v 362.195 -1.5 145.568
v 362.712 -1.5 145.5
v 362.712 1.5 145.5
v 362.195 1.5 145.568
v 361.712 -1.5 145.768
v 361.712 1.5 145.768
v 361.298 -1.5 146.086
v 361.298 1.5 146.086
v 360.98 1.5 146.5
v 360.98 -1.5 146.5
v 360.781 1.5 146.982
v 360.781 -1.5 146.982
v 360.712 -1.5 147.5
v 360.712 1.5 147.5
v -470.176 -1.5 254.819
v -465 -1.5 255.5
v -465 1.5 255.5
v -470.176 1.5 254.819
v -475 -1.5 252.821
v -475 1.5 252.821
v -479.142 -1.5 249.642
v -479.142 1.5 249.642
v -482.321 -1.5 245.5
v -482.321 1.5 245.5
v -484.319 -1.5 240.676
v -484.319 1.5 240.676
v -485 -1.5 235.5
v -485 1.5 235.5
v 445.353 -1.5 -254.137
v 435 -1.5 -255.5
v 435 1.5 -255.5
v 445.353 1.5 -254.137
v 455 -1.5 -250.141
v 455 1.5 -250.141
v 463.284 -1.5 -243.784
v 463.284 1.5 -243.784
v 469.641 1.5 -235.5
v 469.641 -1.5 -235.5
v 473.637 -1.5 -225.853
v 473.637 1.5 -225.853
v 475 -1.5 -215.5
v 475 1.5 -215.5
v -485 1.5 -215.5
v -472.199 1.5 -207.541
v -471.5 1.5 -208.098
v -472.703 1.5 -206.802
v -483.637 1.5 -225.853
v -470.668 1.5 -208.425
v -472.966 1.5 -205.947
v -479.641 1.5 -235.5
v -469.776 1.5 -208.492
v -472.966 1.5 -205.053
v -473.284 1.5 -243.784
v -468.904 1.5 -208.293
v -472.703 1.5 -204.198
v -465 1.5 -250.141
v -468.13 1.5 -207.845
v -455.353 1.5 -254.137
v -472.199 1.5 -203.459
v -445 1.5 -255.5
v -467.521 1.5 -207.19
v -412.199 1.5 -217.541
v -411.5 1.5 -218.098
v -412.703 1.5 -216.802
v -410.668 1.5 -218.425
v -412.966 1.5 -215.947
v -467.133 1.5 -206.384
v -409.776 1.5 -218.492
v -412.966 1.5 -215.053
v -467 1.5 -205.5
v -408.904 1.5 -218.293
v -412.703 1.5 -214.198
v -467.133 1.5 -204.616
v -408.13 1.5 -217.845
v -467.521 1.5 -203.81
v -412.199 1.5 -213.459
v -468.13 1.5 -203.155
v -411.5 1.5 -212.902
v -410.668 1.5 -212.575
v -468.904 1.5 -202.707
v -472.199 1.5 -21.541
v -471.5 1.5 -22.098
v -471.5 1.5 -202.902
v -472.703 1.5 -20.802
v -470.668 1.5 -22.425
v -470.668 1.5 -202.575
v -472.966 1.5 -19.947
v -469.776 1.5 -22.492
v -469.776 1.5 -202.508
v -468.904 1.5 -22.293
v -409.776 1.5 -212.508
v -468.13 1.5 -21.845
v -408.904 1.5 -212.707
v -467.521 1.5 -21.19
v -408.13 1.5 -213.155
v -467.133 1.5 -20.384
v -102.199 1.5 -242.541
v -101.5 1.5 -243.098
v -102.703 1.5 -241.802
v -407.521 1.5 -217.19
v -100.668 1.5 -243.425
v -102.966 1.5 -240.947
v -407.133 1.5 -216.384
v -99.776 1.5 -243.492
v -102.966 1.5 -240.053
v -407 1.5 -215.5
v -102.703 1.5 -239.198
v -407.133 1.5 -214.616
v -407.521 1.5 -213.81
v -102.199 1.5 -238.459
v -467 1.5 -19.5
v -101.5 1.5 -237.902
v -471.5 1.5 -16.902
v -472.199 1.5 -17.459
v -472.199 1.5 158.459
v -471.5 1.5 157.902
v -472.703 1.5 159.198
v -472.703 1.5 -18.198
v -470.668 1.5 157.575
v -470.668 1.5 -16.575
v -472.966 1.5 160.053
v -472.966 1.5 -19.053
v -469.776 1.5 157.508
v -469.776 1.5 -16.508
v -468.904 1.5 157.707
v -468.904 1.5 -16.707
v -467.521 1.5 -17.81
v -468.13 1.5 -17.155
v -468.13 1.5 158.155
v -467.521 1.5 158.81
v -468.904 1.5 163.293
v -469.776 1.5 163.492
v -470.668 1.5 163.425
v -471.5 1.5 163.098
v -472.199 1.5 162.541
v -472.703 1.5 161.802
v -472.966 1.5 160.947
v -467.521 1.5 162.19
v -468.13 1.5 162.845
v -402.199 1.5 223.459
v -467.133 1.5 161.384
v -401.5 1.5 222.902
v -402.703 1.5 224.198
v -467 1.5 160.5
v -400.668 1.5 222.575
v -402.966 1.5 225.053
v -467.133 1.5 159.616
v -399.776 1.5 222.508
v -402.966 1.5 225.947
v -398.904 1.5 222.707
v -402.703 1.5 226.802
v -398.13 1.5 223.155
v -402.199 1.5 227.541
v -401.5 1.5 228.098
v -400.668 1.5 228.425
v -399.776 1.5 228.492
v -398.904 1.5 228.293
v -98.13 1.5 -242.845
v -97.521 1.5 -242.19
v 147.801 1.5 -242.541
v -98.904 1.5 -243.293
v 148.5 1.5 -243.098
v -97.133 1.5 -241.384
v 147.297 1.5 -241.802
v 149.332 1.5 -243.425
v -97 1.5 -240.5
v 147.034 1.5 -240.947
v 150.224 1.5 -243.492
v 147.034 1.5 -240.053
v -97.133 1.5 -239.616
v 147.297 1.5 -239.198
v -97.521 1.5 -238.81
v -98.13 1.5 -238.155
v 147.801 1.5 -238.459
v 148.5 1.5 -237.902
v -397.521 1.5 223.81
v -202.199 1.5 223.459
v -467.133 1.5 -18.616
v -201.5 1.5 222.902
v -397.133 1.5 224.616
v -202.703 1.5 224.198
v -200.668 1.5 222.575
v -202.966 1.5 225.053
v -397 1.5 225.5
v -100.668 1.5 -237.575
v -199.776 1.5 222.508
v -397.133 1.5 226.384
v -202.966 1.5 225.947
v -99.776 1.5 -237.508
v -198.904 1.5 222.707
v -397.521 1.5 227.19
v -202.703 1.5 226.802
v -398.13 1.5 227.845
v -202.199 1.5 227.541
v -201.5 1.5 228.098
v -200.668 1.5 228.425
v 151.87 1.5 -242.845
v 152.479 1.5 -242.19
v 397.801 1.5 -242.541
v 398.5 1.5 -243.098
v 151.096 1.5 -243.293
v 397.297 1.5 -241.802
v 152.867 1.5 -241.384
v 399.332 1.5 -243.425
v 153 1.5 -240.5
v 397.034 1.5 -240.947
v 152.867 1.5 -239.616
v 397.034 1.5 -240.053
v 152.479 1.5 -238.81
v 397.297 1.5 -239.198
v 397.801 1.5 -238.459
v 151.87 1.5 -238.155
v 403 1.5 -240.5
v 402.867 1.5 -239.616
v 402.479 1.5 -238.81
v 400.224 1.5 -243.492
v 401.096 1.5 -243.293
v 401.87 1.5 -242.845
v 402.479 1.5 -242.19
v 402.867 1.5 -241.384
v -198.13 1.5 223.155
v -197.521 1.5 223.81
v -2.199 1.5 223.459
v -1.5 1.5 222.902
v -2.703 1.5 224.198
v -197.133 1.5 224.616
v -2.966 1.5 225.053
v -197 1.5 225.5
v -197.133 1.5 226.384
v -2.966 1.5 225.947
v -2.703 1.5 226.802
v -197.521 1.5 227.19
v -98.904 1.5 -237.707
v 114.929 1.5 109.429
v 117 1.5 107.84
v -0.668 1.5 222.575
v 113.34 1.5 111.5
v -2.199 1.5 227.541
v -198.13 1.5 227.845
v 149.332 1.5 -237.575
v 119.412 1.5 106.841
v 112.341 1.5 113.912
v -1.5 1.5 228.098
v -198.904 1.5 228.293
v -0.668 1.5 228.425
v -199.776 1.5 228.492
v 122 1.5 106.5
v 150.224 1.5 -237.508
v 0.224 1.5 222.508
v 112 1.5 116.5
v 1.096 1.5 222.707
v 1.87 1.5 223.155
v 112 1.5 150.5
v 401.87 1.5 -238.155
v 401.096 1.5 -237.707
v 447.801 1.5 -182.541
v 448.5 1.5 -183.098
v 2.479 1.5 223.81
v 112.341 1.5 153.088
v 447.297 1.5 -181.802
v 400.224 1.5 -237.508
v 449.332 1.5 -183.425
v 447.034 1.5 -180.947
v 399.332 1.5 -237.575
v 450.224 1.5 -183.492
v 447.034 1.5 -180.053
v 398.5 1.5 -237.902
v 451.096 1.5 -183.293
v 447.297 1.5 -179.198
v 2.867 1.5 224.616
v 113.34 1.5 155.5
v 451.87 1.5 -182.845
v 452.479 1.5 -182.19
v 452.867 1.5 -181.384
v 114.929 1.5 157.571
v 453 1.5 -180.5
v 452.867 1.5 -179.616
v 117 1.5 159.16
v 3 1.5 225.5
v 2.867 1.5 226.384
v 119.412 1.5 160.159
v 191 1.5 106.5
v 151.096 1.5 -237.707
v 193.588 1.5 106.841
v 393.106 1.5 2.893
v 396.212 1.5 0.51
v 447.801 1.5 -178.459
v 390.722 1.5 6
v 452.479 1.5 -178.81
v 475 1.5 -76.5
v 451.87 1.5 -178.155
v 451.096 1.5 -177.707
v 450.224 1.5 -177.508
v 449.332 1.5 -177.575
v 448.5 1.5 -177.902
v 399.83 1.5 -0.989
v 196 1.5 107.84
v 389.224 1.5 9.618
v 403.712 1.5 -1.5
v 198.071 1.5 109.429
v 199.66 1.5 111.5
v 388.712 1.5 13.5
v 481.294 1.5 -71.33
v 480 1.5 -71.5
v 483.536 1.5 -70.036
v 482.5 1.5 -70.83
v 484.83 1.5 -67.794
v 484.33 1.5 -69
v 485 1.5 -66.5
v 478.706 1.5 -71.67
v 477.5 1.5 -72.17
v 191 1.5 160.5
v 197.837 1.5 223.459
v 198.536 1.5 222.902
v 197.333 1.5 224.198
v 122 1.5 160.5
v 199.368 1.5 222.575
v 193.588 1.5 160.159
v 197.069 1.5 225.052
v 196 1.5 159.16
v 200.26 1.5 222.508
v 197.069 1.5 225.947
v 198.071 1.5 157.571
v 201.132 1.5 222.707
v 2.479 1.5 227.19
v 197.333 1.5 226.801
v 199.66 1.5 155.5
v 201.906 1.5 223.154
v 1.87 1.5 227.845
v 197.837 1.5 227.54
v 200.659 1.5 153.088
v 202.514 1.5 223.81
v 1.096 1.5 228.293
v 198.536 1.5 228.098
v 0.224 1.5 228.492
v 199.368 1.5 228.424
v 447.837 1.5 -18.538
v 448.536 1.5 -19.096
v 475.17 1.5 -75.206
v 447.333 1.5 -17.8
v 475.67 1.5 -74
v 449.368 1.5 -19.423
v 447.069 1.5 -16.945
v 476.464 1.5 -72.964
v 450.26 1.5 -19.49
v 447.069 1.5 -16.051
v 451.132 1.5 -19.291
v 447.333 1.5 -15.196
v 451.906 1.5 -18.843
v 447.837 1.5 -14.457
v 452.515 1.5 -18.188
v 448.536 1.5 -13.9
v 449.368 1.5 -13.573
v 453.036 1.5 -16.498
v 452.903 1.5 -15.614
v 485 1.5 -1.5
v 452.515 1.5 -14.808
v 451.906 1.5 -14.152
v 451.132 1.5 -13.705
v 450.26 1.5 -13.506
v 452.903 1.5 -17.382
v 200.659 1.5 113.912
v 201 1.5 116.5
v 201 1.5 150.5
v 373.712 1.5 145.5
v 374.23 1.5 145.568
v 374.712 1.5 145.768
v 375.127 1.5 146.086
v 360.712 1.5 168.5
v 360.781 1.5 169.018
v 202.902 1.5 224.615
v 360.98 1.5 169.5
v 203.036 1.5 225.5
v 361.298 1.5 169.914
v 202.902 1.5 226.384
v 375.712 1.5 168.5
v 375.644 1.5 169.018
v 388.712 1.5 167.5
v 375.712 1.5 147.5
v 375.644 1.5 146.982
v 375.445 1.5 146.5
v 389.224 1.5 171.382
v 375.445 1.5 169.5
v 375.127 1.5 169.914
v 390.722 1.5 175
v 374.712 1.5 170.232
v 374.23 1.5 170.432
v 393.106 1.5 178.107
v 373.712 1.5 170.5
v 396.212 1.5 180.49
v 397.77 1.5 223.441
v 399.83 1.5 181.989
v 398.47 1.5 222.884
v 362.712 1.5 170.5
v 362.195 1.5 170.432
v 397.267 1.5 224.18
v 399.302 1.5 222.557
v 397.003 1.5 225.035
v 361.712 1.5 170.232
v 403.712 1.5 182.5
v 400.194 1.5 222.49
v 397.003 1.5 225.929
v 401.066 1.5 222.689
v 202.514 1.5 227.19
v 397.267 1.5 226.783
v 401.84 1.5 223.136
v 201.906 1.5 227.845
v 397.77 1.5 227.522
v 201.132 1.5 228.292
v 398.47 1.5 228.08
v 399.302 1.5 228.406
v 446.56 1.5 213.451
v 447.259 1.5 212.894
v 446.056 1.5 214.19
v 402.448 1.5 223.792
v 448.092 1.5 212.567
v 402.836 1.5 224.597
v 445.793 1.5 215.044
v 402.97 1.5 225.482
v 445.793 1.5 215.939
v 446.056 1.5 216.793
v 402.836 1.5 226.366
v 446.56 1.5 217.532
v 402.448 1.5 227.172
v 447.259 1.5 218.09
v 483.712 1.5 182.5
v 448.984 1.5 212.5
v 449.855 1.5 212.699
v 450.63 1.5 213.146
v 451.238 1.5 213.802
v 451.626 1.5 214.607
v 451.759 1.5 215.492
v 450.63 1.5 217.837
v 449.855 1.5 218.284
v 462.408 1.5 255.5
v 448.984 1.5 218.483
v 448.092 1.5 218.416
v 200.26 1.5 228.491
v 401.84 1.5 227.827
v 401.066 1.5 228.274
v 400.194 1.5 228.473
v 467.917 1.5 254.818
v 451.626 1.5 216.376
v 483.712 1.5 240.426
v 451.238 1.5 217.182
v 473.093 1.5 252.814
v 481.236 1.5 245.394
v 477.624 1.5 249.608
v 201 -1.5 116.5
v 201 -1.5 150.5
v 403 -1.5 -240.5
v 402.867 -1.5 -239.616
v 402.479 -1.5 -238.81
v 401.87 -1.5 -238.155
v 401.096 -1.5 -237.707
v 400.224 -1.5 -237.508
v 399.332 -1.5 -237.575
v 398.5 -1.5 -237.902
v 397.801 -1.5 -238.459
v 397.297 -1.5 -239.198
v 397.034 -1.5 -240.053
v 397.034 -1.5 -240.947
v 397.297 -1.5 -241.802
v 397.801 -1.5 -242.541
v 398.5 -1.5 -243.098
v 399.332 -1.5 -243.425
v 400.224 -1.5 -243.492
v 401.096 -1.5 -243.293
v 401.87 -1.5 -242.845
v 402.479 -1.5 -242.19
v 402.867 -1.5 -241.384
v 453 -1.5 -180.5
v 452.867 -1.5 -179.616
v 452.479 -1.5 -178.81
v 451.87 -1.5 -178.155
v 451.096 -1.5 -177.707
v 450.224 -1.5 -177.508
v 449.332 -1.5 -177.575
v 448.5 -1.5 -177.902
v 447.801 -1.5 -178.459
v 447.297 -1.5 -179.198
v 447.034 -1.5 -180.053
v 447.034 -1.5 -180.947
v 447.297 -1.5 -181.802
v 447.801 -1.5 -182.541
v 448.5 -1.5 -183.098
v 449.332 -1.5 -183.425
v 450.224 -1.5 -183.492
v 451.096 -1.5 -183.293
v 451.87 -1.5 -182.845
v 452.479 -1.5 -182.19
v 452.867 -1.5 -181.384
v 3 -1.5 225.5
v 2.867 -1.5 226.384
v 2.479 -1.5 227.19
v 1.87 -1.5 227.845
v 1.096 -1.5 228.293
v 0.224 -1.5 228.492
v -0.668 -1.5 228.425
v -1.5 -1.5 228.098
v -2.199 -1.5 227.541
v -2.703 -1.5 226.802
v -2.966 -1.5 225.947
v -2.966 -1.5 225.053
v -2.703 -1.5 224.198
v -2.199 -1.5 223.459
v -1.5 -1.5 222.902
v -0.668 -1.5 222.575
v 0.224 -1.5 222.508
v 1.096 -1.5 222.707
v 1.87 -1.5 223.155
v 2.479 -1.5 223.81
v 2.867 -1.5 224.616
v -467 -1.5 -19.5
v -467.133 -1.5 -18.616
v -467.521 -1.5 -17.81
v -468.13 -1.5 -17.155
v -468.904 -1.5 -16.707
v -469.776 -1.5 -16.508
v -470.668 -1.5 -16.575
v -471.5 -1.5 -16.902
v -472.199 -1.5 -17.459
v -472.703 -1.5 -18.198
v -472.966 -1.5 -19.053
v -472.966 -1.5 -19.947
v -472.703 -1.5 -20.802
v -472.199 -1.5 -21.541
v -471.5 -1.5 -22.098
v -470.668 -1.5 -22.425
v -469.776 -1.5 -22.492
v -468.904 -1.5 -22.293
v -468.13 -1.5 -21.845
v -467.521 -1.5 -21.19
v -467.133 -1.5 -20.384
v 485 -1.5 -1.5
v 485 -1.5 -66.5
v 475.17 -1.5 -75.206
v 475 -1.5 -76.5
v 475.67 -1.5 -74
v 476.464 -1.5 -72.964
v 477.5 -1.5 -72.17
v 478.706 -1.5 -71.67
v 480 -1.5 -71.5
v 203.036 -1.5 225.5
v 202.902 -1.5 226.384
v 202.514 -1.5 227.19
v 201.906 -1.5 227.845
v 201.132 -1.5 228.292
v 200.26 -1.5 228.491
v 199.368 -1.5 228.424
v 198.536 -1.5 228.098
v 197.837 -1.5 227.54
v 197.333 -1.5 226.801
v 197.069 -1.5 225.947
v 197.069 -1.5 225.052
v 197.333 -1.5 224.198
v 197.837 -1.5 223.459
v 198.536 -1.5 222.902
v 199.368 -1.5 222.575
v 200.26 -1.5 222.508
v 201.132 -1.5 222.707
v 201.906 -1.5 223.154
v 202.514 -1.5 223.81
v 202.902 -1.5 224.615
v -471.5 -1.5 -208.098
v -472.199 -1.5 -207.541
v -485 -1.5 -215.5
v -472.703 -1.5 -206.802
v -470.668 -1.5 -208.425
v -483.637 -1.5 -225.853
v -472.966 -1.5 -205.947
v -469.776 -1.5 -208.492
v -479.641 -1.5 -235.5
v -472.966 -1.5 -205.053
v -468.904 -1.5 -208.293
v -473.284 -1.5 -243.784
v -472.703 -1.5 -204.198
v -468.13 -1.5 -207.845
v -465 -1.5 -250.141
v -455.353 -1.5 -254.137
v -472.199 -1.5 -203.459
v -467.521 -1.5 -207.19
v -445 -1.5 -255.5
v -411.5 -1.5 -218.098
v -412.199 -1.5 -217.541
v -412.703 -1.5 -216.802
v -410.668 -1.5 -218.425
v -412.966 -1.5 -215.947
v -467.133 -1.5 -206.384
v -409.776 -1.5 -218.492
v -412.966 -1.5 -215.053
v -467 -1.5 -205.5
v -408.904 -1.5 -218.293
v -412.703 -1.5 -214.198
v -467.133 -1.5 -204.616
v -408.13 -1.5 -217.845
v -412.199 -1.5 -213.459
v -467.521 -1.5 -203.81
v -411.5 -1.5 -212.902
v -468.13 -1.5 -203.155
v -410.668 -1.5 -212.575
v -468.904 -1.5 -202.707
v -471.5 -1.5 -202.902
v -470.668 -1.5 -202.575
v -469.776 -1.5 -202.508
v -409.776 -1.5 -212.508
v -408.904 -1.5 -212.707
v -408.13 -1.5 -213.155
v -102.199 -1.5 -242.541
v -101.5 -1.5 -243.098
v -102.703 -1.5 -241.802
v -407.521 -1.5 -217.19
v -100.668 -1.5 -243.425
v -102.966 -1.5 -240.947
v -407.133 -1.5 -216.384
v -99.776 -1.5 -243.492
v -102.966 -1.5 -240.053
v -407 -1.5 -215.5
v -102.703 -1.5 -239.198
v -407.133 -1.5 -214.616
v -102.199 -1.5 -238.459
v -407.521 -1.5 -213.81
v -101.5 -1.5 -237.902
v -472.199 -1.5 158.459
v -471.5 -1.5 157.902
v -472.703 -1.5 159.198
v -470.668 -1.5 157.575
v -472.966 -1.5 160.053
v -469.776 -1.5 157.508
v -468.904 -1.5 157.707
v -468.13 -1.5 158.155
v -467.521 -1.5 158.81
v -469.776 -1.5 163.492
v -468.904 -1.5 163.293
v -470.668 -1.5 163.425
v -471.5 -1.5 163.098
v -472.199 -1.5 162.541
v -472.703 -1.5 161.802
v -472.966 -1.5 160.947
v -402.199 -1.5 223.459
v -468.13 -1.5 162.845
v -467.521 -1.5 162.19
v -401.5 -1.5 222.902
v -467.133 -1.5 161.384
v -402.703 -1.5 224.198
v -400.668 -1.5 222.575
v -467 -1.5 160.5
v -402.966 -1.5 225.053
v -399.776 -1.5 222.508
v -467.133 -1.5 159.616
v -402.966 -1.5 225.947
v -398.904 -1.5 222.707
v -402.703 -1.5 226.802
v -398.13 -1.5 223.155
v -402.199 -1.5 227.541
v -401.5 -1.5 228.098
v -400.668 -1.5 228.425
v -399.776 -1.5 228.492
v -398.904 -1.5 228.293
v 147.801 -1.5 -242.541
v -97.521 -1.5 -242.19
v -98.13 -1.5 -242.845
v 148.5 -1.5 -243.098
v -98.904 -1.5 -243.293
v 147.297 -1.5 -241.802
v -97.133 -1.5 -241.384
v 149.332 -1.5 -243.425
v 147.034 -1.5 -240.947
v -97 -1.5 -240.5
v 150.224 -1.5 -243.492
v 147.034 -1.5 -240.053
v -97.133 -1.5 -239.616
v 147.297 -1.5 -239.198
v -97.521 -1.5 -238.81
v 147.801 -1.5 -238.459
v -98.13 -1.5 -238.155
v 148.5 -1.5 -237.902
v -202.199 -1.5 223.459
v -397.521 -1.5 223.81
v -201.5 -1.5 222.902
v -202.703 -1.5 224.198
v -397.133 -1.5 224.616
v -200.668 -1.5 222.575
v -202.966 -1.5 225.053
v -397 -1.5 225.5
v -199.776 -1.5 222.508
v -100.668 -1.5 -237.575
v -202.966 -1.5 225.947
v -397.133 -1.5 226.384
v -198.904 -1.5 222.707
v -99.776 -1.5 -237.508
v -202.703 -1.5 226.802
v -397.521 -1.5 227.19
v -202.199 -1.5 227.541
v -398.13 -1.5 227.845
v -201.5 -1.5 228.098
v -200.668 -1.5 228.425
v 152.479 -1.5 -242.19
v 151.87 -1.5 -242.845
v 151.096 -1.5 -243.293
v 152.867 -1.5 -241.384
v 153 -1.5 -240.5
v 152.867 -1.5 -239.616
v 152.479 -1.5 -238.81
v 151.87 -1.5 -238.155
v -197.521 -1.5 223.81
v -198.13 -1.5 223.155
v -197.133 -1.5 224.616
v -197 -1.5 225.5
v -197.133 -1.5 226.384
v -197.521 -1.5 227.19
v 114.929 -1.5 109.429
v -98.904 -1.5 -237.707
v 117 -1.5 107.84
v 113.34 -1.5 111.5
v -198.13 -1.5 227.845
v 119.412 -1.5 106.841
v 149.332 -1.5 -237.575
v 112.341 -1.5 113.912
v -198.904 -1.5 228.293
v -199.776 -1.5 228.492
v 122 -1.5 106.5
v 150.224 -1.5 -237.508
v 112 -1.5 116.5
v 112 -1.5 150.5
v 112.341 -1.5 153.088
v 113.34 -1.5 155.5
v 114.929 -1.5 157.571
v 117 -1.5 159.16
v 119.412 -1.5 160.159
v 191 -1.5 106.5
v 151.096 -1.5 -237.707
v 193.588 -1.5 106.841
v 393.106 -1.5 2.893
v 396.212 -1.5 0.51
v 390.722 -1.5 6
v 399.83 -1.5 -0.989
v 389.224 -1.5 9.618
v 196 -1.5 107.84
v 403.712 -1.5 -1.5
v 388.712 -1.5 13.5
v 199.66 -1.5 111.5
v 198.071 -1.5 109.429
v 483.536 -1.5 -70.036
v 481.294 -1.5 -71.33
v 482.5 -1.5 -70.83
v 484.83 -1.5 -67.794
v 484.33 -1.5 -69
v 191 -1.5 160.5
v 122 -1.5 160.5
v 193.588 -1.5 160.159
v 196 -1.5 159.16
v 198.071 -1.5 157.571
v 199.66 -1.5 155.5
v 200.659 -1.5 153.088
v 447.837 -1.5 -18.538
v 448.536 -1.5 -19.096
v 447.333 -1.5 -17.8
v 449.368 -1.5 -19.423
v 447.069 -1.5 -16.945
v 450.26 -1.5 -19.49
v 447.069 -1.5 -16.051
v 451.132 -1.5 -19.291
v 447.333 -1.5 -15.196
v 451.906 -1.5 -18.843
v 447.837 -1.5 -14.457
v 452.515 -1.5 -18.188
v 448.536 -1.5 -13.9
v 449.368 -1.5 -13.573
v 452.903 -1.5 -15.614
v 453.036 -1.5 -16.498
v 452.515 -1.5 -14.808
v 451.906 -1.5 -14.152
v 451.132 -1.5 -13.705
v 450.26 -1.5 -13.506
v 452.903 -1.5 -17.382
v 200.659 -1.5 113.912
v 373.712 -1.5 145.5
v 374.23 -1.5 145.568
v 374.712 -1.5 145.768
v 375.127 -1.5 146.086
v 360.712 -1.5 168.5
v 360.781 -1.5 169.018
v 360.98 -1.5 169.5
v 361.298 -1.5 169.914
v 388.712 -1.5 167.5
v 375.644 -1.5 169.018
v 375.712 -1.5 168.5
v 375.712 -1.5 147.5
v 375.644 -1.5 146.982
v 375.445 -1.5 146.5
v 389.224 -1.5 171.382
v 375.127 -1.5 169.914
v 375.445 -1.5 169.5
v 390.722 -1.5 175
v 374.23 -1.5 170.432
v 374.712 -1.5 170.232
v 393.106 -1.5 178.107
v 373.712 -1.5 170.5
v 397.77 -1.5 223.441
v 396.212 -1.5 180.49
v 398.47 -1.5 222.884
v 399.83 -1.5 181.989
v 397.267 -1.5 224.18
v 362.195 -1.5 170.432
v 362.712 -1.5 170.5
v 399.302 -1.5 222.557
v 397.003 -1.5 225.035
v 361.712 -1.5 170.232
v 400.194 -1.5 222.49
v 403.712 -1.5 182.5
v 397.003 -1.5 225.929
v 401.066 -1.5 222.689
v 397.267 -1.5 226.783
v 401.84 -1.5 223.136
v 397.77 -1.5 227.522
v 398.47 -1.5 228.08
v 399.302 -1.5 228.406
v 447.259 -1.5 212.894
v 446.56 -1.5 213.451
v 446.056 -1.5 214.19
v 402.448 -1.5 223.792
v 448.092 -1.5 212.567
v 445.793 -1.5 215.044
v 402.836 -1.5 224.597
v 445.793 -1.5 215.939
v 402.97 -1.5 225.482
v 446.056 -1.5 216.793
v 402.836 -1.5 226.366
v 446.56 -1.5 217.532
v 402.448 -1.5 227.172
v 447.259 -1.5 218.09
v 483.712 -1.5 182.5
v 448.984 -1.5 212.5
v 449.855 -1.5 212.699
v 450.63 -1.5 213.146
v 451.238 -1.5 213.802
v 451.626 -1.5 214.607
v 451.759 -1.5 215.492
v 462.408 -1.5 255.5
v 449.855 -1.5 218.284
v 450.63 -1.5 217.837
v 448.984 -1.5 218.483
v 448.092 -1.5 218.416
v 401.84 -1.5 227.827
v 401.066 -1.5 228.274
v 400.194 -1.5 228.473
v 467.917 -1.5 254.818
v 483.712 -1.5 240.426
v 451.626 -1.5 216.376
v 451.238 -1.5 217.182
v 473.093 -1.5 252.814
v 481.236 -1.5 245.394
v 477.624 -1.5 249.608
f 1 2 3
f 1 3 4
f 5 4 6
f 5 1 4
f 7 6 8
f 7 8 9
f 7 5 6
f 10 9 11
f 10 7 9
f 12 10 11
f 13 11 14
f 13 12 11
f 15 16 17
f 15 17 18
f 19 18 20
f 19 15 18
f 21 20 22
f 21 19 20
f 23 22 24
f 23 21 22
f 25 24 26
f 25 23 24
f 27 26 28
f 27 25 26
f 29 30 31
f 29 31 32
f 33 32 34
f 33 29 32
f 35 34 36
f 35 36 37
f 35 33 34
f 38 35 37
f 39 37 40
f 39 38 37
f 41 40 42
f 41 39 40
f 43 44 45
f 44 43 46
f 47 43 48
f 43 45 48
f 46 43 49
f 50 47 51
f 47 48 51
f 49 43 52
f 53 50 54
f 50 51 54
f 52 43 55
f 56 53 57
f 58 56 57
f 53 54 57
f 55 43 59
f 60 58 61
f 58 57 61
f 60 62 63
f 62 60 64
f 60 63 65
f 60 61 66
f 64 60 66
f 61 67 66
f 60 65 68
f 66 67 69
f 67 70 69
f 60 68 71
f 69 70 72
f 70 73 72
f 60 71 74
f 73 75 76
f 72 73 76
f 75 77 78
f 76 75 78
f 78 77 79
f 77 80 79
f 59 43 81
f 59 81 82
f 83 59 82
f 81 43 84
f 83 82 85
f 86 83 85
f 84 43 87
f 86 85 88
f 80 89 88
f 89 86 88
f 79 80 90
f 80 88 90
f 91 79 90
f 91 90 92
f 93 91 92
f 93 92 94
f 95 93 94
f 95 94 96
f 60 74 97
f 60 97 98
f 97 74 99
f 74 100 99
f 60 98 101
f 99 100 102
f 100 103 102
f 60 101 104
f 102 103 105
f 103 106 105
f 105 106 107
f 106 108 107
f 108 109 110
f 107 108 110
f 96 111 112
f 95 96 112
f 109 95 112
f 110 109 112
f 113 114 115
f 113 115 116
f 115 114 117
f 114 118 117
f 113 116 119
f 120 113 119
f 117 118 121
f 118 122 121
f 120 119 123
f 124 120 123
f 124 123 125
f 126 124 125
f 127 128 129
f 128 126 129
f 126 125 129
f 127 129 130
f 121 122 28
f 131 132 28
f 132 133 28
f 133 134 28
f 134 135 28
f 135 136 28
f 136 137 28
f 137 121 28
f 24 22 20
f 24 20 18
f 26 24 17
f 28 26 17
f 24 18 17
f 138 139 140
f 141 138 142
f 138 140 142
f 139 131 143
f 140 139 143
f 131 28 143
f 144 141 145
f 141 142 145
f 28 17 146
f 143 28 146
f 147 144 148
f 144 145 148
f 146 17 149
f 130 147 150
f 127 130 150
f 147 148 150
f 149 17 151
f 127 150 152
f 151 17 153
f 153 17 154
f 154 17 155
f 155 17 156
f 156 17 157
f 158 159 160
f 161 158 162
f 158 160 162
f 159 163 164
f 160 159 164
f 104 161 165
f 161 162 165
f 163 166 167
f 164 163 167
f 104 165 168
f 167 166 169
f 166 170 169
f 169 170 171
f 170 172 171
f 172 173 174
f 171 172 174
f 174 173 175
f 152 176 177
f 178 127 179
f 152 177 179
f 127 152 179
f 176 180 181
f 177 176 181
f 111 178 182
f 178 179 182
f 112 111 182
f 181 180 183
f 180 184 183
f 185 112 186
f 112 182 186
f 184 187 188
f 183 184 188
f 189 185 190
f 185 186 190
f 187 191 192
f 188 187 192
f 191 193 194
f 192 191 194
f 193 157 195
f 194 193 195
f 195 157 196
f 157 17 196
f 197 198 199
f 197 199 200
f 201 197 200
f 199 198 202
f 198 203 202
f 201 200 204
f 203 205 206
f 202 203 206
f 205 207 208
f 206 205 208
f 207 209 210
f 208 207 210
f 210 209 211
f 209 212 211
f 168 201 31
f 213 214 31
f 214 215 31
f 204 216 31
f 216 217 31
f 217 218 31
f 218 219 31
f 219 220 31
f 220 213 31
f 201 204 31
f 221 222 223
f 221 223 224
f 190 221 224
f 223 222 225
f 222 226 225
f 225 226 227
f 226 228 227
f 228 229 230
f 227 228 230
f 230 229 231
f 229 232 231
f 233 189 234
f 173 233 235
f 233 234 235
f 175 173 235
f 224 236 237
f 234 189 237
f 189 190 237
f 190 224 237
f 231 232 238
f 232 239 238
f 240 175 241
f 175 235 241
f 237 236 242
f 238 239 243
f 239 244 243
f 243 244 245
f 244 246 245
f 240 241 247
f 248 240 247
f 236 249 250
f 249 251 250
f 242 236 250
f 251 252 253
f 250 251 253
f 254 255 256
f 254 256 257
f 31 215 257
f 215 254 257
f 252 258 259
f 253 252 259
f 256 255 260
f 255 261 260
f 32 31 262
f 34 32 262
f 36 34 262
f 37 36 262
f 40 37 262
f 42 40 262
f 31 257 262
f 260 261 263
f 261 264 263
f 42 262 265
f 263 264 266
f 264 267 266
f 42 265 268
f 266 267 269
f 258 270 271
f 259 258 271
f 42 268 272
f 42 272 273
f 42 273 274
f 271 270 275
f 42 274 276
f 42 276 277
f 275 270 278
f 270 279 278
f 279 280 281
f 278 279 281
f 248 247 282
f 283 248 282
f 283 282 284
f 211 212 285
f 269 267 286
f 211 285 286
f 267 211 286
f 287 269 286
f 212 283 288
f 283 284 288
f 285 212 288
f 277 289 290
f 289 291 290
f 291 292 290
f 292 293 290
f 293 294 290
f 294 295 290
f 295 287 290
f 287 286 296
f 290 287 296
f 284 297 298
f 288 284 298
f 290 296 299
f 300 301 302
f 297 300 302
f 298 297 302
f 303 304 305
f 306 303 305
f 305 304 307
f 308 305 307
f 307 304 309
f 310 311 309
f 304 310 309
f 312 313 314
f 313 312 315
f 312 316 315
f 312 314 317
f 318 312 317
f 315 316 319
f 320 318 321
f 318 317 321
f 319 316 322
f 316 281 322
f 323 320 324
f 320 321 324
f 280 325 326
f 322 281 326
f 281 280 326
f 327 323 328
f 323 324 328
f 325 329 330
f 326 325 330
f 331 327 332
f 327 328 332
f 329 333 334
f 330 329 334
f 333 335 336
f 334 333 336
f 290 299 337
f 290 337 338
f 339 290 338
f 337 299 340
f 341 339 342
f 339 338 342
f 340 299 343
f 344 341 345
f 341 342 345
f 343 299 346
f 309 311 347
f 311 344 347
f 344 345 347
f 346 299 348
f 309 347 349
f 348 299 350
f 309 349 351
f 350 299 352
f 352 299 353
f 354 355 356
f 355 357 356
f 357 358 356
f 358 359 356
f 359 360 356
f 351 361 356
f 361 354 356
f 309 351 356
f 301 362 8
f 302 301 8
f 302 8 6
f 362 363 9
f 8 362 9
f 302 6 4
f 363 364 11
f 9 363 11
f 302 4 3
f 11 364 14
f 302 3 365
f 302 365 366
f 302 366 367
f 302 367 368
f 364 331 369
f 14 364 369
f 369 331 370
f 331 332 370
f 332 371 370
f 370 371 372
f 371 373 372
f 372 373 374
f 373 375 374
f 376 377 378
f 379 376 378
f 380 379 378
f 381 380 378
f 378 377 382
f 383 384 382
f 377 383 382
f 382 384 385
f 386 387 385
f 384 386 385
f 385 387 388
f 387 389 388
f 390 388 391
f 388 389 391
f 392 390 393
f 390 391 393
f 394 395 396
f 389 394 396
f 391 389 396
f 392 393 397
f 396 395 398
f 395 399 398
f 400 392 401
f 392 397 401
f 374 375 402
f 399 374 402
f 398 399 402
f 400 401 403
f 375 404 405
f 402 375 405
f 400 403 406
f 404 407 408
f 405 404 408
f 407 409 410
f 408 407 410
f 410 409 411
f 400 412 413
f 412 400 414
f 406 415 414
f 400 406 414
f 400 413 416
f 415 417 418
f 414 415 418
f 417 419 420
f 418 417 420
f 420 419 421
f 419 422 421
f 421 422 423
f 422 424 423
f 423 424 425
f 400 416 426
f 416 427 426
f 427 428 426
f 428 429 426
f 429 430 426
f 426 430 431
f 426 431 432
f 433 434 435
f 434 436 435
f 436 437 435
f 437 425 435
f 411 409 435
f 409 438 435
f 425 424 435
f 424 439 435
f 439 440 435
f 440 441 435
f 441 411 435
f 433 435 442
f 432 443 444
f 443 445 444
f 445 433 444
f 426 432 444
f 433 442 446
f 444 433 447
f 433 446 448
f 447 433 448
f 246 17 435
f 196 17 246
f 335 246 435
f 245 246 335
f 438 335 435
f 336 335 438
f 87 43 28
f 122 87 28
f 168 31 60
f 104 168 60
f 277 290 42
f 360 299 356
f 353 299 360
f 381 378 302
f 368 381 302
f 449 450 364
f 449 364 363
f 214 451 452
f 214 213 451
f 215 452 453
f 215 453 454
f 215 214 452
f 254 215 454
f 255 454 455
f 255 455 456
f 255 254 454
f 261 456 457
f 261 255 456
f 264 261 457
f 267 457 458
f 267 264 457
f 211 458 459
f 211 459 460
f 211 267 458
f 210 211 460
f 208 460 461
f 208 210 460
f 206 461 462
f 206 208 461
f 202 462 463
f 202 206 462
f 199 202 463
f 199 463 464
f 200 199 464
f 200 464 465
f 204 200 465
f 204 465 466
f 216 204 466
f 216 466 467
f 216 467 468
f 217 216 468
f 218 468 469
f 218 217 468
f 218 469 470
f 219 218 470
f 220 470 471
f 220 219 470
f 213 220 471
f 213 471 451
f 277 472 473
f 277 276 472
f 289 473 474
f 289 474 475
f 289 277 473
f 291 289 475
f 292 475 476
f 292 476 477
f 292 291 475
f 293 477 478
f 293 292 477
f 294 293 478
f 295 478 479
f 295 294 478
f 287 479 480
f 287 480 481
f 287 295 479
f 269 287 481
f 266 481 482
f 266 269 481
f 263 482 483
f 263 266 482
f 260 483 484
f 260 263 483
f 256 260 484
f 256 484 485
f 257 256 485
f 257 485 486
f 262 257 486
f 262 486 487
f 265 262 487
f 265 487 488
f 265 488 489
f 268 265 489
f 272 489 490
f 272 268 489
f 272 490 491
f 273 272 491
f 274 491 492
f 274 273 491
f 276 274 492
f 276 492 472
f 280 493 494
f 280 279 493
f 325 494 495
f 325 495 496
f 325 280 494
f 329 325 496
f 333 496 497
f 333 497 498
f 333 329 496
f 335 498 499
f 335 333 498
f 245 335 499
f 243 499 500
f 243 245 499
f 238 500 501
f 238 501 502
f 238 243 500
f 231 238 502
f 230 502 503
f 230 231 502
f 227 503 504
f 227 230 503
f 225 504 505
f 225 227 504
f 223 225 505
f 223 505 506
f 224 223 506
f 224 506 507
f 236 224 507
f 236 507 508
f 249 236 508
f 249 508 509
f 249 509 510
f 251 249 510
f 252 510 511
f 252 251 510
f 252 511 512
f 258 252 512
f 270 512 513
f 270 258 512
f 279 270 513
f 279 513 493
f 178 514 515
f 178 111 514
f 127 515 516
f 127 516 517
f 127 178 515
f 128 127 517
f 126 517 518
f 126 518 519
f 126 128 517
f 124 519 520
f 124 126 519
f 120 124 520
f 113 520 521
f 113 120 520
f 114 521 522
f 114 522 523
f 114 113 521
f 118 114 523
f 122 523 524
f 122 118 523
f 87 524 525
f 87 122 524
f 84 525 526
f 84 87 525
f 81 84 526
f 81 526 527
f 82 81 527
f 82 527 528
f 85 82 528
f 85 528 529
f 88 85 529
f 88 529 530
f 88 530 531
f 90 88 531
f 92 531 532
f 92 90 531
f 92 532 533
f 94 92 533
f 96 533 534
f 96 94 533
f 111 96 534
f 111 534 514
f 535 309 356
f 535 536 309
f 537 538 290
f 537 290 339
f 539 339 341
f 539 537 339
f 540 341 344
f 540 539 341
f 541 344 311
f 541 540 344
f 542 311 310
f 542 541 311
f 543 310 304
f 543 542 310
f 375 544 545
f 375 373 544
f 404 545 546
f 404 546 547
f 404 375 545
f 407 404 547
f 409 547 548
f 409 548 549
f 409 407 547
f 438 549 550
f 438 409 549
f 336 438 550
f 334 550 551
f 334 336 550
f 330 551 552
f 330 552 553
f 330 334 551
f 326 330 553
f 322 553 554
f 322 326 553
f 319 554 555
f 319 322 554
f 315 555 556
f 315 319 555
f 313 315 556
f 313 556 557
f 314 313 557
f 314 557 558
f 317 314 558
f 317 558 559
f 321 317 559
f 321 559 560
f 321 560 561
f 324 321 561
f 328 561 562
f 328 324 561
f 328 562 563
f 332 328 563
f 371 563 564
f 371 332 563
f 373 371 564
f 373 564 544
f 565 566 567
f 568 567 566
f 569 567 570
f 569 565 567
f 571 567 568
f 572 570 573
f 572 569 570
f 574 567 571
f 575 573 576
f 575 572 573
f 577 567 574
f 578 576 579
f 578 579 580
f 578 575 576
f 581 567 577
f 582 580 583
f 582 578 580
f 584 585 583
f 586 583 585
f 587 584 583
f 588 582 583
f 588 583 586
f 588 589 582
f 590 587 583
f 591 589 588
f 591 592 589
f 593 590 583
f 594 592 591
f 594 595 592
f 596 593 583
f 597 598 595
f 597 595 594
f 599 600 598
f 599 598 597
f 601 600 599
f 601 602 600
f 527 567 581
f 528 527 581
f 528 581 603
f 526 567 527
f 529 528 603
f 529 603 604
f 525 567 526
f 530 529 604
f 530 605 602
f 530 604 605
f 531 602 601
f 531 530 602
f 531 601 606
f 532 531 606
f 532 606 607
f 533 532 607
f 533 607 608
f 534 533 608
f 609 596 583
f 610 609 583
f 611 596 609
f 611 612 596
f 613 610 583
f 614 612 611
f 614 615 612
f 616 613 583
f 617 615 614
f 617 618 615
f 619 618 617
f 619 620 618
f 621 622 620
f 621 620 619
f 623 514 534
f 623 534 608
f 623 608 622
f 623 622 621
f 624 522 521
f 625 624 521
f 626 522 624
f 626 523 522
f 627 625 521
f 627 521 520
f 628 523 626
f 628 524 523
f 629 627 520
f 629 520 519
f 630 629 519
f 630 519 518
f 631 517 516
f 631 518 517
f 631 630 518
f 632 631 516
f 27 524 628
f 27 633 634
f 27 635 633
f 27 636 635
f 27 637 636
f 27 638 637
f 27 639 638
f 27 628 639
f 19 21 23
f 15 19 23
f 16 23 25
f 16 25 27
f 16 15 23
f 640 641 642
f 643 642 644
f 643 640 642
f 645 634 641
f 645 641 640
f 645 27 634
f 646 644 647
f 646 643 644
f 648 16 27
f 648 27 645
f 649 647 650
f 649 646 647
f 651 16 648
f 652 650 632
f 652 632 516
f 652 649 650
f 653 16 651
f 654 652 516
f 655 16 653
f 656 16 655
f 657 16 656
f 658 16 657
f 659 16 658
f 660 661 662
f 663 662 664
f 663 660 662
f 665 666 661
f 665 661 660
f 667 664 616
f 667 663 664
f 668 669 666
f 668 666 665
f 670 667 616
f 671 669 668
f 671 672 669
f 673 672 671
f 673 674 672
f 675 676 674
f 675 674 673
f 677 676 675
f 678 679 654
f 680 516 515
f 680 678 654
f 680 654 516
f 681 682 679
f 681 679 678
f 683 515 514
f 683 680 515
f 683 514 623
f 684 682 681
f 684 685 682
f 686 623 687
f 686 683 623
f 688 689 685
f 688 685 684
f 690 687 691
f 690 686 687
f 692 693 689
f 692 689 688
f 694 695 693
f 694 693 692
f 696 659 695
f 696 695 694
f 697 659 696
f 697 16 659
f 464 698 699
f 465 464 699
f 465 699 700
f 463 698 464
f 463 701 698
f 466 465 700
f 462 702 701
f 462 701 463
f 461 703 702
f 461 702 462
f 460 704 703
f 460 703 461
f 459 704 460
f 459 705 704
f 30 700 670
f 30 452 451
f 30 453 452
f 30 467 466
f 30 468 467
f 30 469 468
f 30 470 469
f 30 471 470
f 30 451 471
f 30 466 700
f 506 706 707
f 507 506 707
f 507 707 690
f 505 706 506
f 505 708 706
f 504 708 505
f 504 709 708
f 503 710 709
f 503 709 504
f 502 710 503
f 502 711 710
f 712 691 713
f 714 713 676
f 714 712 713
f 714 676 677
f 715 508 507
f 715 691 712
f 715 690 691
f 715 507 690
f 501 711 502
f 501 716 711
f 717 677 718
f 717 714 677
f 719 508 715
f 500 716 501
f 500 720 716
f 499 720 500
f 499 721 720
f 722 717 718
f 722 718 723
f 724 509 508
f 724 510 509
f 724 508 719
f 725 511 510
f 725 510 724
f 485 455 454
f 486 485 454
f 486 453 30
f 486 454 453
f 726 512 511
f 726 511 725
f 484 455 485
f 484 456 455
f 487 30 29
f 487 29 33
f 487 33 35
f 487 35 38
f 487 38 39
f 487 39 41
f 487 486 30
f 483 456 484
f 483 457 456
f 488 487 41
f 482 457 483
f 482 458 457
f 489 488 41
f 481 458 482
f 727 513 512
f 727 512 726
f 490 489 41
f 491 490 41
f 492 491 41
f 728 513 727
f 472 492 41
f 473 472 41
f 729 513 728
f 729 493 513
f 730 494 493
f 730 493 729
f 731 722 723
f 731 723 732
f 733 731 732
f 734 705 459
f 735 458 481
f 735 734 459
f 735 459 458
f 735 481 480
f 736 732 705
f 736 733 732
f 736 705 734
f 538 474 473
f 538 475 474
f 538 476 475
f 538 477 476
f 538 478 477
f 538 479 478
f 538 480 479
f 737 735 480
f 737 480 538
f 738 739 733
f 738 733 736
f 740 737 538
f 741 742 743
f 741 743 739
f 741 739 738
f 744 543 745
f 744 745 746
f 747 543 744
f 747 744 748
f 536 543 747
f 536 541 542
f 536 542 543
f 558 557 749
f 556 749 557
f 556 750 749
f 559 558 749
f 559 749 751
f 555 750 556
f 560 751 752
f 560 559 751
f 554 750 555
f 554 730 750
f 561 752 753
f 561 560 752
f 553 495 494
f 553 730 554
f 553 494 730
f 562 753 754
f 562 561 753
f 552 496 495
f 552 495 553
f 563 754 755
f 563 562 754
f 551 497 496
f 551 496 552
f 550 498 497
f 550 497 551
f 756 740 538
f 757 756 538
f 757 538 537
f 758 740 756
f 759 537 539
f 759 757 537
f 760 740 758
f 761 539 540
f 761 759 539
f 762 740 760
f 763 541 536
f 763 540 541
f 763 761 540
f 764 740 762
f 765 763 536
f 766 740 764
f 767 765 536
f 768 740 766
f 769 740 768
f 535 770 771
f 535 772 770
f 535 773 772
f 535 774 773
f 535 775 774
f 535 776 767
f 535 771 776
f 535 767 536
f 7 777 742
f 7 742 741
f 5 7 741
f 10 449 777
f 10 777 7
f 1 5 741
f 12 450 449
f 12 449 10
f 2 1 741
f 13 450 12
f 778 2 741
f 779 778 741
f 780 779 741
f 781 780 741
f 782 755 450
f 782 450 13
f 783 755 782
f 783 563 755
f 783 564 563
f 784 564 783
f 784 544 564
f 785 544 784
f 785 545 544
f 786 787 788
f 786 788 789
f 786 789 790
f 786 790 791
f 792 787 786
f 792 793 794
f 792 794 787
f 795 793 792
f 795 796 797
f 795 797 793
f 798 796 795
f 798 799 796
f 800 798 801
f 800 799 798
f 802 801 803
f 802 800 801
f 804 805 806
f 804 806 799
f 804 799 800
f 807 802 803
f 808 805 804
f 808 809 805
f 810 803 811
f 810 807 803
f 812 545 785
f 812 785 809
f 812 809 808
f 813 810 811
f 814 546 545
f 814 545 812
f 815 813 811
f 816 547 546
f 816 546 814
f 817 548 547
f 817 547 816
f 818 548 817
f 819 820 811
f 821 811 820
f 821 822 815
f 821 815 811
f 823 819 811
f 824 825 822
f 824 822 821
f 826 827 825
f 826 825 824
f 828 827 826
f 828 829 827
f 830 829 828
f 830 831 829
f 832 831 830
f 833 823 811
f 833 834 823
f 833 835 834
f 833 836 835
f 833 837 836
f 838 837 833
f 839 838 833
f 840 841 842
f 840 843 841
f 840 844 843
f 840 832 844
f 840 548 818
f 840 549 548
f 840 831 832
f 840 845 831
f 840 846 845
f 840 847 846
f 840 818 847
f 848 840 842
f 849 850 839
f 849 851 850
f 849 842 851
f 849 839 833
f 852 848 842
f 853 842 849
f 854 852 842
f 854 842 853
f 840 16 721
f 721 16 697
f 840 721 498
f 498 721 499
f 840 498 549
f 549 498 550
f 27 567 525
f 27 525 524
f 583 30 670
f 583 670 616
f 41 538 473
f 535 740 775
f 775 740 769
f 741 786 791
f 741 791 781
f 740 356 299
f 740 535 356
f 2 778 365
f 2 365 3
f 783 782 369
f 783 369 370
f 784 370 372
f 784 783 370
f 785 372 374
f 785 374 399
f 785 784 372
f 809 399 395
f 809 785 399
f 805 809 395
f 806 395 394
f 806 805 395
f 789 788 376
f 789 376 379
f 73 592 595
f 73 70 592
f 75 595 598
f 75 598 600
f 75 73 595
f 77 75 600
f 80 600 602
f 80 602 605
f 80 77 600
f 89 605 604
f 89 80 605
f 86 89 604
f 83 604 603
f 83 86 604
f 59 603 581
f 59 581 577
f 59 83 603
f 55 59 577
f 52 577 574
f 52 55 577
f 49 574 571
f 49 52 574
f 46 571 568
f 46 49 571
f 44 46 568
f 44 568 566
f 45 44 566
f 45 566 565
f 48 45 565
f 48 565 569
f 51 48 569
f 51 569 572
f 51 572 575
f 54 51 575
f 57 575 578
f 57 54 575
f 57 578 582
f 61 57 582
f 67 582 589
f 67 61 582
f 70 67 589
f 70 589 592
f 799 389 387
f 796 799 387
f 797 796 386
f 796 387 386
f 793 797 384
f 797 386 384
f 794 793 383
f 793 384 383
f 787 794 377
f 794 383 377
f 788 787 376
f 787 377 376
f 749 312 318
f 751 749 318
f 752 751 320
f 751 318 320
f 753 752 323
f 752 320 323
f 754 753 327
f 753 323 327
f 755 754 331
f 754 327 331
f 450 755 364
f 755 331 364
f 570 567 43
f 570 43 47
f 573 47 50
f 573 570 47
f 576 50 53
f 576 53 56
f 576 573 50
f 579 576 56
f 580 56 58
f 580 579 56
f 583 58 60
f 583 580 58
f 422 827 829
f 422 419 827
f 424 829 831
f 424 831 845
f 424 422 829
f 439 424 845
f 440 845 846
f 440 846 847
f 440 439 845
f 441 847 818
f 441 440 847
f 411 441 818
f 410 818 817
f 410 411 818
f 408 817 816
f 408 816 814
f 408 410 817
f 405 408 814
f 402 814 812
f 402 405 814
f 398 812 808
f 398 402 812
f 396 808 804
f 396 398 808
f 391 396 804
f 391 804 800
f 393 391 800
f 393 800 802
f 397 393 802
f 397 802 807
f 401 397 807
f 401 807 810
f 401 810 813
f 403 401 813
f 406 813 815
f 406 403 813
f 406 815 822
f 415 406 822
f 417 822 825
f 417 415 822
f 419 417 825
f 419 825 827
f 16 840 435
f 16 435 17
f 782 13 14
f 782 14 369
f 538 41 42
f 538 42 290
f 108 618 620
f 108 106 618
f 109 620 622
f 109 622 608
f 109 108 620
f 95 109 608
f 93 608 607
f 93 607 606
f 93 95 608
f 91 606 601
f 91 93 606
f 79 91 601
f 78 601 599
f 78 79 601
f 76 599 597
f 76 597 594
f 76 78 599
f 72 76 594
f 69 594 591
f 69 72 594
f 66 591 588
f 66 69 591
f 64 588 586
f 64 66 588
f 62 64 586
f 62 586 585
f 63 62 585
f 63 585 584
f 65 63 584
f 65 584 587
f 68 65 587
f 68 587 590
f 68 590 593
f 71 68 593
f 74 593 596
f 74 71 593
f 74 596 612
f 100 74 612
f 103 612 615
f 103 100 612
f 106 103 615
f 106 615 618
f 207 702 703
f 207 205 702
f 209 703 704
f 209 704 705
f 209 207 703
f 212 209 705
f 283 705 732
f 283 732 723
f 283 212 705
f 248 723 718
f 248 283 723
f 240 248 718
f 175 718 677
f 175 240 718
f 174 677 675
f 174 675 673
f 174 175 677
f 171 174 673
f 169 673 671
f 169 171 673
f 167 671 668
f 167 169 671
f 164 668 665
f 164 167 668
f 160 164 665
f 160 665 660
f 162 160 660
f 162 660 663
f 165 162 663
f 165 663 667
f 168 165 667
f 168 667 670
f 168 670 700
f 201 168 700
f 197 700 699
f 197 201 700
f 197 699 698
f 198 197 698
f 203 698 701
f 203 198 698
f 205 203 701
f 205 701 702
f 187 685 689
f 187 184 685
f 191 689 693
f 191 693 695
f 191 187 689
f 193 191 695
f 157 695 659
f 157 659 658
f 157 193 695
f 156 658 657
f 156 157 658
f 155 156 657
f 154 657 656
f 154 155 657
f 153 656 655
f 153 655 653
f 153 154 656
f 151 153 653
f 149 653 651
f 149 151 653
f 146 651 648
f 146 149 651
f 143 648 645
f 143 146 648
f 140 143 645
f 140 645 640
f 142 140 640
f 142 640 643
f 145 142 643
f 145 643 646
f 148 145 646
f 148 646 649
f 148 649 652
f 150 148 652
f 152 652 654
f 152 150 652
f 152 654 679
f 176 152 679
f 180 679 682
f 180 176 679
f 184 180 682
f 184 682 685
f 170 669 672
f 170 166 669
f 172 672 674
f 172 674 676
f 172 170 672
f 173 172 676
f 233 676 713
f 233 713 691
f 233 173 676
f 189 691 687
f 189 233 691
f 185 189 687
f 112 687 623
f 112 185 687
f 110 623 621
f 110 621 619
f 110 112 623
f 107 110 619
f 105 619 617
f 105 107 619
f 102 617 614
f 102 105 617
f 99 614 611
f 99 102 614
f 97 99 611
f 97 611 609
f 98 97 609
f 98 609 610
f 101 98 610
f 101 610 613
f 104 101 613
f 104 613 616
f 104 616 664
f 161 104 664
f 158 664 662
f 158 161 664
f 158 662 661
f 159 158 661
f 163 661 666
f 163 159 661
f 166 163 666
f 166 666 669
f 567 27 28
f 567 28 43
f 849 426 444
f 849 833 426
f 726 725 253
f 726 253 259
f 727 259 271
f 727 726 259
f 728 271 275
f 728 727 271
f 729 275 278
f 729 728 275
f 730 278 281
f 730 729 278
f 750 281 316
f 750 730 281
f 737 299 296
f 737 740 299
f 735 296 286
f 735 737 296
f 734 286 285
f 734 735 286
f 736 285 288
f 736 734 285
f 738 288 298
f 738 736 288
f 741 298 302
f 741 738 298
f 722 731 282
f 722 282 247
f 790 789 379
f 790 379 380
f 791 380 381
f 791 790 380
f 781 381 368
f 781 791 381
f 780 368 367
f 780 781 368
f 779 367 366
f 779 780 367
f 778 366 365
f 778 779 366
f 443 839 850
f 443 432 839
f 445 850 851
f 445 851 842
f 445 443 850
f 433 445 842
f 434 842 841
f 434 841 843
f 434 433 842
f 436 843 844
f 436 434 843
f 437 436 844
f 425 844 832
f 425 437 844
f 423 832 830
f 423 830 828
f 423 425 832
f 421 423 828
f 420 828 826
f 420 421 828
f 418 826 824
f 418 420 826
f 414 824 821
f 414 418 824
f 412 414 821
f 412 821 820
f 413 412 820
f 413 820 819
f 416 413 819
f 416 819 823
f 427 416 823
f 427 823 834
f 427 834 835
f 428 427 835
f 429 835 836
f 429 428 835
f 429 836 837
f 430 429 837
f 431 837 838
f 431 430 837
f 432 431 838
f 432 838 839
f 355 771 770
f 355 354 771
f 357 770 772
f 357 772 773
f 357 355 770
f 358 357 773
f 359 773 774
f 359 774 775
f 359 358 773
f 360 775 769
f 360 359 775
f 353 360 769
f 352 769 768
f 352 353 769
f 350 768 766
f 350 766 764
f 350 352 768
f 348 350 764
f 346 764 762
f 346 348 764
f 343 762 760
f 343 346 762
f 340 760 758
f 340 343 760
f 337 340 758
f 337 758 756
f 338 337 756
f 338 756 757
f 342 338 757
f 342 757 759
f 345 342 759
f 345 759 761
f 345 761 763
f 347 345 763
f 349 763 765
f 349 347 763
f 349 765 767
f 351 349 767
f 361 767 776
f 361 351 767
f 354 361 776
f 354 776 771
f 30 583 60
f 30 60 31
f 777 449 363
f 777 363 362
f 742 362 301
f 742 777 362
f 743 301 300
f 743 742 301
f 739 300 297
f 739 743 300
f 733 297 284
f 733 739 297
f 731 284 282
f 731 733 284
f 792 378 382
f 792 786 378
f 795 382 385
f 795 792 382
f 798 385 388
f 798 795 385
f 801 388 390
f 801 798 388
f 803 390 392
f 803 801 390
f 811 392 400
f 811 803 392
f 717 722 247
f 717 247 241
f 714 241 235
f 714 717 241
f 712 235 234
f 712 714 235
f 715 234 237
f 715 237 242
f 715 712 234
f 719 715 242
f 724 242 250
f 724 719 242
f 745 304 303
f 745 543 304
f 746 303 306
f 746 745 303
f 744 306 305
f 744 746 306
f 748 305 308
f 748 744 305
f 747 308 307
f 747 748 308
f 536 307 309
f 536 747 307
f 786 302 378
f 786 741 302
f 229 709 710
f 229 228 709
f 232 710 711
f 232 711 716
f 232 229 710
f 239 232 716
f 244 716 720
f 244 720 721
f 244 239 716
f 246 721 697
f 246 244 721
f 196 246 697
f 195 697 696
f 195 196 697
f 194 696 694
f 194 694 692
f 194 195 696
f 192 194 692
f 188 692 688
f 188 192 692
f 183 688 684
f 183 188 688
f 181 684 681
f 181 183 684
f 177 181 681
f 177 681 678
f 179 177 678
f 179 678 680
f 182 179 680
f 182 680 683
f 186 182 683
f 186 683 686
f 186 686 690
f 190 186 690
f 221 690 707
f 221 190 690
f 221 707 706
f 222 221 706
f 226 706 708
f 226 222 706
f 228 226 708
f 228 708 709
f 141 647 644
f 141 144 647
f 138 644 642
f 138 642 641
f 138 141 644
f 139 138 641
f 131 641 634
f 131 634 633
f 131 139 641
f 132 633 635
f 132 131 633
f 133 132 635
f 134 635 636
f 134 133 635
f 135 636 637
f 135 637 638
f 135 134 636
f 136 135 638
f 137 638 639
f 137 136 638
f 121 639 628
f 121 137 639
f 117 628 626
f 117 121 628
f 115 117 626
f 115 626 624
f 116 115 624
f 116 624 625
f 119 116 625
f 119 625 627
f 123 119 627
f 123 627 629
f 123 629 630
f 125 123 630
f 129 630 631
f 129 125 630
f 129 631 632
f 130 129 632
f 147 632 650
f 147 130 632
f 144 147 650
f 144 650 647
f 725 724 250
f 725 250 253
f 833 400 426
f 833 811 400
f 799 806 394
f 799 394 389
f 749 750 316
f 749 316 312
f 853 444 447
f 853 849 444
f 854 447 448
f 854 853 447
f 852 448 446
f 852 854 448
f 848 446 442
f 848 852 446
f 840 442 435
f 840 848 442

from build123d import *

# Parameters (mm, degrees)
F0_R     = 3
F1_DEPTH = 1.5


with BuildPart() as f1:
    # F0 (on Front) → F1 (new body, symmetric)
    with BuildSketch(Plane.XZ):
        with BuildLine():
            ThreePointArc((483.7124742394, 240.4259464291), (475.4570998666, 251.3503928024), (462.4081345934, 255.5))
            Line((462.4081345934, 255.5), (-465, 255.5))
            ThreePointArc((-465, 255.5), (-479.1421356237, 249.6421356237), (-485, 235.5))
            Line((-485, 235.5), (-485, -215.5))
            ThreePointArc((-485, -215.5), (-473.2842712475, -243.7842712475), (-445, -255.5))
            Line((-445, -255.5), (0, -255.5))
            Line((0, -255.5), (435, -255.5))
            ThreePointArc((435, -255.5), (463.2842712475, -243.7842712475), (475, -215.5))
            Line((475, -215.5), (475, -81.5))
            Line((475, -81.5), (475, -76.5))
            ThreePointArc((475, -76.5), (476.4644660941, -72.9644660941), (480, -71.5))
            ThreePointArc((480, -71.5), (483.5355339059, -70.0355339059), (485, -66.5))
            Line((485, -66.5), (485, -61.5))
            Line((485, -61.5), (485, -1.5))
            Line((485, -1.5), (462.8157010189, -1.5))
            Line((462.8157010189, -1.5), (403.7124742394, -1.5))
            ThreePointArc((403.7124742394, -1.5), (393.1058725216, 2.8933982822), (388.7124742394, 13.5))
            Line((388.7124742394, 13.5), (388.7124742394, 167.5))
            ThreePointArc((388.7124742394, 167.5), (393.1058725216, 178.1066017178), (403.7124742394, 182.5))
            Line((403.7124742394, 182.5), (483.7124742394, 182.5))
            Line((483.7124742394, 182.5), (483.7124742394, 240.4259464291))
        make_face()
        with Locations((-470, -205.5)):
            Circle(F0_R, mode=Mode.SUBTRACT)
        with Locations((-410, -215.5)):
            Circle(F0_R, mode=Mode.SUBTRACT)
        with Locations((-100, -240.5)):
            Circle(F0_R, mode=Mode.SUBTRACT)
        with Locations((-470, -19.5)):
            Circle(F0_R, mode=Mode.SUBTRACT)
        with Locations((150, -240.5)):
            Circle(F0_R, mode=Mode.SUBTRACT)
        with Locations((400, -240.5)):
            Circle(F0_R, mode=Mode.SUBTRACT)
        with Locations((450, -180.5)):
            Circle(F0_R, mode=Mode.SUBTRACT)
        with Locations((450.0357970595, -16.4979236722)):
            Circle(F0_R, mode=Mode.SUBTRACT)
        with Locations((-470, 160.5)):
            Circle(F0_R, mode=Mode.SUBTRACT)
        with Locations((-400, 225.5)):
            Circle(F0_R, mode=Mode.SUBTRACT)
        with Locations((-200, 225.5)):
            Circle(F0_R, mode=Mode.SUBTRACT)
        with BuildLine():
            Line((112, 116.5), (112, 150.5))
            ThreePointArc((112, 150.5), (114.9289321881, 157.5710678119), (122, 160.5))
            Line((122, 160.5), (191, 160.5))
            ThreePointArc((191, 160.5), (198.0710678119, 157.5710678119), (201, 150.5))
            Line((201, 150.5), (201, 116.5))
            ThreePointArc((201, 116.5), (198.0710678119, 109.4289321881), (191, 106.5))
            Line((191, 106.5), (122, 106.5))
            ThreePointArc((122, 106.5), (114.9289321881, 109.4289321881), (112, 116.5))
        make_face(mode=Mode.SUBTRACT)
        with Locations((0, 225.5)):
            Circle(F0_R, mode=Mode.SUBTRACT)
        with Locations((200.0356763601, 225.499600172)):
            Circle(F0_R, mode=Mode.SUBTRACT)
        with BuildLine():
            Line((360.7124742394, 147.5), (360.7124742394, 168.5))
            ThreePointArc((360.7124742394, 168.5), (361.298260677, 169.9142135624), (362.7124742394, 170.5))
            Line((362.7124742394, 170.5), (373.7124742394, 170.5))
            ThreePointArc((373.7124742394, 170.5), (375.1266878018, 169.9142135624), (375.7124742394, 168.5))
            Line((375.7124742394, 168.5), (375.7124742394, 147.5))
            ThreePointArc((375.7124742394, 147.5), (375.1266878018, 146.0857864376), (373.7124742394, 145.5))
            Line((373.7124742394, 145.5), (362.7124742394, 145.5))
            ThreePointArc((362.7124742394, 145.5), (361.298260677, 146.0857864376), (360.7124742394, 147.5))
        make_face(mode=Mode.SUBTRACT)
        with Locations((448.759393394, 215.4916015863)):
            Circle(F0_R, mode=Mode.SUBTRACT)
        with Locations((399.9695941806, 225.4816529751)):
            Circle(F0_R, mode=Mode.SUBTRACT)
    extrude(amount=F1_DEPTH, both=True)


solid = f1.part
